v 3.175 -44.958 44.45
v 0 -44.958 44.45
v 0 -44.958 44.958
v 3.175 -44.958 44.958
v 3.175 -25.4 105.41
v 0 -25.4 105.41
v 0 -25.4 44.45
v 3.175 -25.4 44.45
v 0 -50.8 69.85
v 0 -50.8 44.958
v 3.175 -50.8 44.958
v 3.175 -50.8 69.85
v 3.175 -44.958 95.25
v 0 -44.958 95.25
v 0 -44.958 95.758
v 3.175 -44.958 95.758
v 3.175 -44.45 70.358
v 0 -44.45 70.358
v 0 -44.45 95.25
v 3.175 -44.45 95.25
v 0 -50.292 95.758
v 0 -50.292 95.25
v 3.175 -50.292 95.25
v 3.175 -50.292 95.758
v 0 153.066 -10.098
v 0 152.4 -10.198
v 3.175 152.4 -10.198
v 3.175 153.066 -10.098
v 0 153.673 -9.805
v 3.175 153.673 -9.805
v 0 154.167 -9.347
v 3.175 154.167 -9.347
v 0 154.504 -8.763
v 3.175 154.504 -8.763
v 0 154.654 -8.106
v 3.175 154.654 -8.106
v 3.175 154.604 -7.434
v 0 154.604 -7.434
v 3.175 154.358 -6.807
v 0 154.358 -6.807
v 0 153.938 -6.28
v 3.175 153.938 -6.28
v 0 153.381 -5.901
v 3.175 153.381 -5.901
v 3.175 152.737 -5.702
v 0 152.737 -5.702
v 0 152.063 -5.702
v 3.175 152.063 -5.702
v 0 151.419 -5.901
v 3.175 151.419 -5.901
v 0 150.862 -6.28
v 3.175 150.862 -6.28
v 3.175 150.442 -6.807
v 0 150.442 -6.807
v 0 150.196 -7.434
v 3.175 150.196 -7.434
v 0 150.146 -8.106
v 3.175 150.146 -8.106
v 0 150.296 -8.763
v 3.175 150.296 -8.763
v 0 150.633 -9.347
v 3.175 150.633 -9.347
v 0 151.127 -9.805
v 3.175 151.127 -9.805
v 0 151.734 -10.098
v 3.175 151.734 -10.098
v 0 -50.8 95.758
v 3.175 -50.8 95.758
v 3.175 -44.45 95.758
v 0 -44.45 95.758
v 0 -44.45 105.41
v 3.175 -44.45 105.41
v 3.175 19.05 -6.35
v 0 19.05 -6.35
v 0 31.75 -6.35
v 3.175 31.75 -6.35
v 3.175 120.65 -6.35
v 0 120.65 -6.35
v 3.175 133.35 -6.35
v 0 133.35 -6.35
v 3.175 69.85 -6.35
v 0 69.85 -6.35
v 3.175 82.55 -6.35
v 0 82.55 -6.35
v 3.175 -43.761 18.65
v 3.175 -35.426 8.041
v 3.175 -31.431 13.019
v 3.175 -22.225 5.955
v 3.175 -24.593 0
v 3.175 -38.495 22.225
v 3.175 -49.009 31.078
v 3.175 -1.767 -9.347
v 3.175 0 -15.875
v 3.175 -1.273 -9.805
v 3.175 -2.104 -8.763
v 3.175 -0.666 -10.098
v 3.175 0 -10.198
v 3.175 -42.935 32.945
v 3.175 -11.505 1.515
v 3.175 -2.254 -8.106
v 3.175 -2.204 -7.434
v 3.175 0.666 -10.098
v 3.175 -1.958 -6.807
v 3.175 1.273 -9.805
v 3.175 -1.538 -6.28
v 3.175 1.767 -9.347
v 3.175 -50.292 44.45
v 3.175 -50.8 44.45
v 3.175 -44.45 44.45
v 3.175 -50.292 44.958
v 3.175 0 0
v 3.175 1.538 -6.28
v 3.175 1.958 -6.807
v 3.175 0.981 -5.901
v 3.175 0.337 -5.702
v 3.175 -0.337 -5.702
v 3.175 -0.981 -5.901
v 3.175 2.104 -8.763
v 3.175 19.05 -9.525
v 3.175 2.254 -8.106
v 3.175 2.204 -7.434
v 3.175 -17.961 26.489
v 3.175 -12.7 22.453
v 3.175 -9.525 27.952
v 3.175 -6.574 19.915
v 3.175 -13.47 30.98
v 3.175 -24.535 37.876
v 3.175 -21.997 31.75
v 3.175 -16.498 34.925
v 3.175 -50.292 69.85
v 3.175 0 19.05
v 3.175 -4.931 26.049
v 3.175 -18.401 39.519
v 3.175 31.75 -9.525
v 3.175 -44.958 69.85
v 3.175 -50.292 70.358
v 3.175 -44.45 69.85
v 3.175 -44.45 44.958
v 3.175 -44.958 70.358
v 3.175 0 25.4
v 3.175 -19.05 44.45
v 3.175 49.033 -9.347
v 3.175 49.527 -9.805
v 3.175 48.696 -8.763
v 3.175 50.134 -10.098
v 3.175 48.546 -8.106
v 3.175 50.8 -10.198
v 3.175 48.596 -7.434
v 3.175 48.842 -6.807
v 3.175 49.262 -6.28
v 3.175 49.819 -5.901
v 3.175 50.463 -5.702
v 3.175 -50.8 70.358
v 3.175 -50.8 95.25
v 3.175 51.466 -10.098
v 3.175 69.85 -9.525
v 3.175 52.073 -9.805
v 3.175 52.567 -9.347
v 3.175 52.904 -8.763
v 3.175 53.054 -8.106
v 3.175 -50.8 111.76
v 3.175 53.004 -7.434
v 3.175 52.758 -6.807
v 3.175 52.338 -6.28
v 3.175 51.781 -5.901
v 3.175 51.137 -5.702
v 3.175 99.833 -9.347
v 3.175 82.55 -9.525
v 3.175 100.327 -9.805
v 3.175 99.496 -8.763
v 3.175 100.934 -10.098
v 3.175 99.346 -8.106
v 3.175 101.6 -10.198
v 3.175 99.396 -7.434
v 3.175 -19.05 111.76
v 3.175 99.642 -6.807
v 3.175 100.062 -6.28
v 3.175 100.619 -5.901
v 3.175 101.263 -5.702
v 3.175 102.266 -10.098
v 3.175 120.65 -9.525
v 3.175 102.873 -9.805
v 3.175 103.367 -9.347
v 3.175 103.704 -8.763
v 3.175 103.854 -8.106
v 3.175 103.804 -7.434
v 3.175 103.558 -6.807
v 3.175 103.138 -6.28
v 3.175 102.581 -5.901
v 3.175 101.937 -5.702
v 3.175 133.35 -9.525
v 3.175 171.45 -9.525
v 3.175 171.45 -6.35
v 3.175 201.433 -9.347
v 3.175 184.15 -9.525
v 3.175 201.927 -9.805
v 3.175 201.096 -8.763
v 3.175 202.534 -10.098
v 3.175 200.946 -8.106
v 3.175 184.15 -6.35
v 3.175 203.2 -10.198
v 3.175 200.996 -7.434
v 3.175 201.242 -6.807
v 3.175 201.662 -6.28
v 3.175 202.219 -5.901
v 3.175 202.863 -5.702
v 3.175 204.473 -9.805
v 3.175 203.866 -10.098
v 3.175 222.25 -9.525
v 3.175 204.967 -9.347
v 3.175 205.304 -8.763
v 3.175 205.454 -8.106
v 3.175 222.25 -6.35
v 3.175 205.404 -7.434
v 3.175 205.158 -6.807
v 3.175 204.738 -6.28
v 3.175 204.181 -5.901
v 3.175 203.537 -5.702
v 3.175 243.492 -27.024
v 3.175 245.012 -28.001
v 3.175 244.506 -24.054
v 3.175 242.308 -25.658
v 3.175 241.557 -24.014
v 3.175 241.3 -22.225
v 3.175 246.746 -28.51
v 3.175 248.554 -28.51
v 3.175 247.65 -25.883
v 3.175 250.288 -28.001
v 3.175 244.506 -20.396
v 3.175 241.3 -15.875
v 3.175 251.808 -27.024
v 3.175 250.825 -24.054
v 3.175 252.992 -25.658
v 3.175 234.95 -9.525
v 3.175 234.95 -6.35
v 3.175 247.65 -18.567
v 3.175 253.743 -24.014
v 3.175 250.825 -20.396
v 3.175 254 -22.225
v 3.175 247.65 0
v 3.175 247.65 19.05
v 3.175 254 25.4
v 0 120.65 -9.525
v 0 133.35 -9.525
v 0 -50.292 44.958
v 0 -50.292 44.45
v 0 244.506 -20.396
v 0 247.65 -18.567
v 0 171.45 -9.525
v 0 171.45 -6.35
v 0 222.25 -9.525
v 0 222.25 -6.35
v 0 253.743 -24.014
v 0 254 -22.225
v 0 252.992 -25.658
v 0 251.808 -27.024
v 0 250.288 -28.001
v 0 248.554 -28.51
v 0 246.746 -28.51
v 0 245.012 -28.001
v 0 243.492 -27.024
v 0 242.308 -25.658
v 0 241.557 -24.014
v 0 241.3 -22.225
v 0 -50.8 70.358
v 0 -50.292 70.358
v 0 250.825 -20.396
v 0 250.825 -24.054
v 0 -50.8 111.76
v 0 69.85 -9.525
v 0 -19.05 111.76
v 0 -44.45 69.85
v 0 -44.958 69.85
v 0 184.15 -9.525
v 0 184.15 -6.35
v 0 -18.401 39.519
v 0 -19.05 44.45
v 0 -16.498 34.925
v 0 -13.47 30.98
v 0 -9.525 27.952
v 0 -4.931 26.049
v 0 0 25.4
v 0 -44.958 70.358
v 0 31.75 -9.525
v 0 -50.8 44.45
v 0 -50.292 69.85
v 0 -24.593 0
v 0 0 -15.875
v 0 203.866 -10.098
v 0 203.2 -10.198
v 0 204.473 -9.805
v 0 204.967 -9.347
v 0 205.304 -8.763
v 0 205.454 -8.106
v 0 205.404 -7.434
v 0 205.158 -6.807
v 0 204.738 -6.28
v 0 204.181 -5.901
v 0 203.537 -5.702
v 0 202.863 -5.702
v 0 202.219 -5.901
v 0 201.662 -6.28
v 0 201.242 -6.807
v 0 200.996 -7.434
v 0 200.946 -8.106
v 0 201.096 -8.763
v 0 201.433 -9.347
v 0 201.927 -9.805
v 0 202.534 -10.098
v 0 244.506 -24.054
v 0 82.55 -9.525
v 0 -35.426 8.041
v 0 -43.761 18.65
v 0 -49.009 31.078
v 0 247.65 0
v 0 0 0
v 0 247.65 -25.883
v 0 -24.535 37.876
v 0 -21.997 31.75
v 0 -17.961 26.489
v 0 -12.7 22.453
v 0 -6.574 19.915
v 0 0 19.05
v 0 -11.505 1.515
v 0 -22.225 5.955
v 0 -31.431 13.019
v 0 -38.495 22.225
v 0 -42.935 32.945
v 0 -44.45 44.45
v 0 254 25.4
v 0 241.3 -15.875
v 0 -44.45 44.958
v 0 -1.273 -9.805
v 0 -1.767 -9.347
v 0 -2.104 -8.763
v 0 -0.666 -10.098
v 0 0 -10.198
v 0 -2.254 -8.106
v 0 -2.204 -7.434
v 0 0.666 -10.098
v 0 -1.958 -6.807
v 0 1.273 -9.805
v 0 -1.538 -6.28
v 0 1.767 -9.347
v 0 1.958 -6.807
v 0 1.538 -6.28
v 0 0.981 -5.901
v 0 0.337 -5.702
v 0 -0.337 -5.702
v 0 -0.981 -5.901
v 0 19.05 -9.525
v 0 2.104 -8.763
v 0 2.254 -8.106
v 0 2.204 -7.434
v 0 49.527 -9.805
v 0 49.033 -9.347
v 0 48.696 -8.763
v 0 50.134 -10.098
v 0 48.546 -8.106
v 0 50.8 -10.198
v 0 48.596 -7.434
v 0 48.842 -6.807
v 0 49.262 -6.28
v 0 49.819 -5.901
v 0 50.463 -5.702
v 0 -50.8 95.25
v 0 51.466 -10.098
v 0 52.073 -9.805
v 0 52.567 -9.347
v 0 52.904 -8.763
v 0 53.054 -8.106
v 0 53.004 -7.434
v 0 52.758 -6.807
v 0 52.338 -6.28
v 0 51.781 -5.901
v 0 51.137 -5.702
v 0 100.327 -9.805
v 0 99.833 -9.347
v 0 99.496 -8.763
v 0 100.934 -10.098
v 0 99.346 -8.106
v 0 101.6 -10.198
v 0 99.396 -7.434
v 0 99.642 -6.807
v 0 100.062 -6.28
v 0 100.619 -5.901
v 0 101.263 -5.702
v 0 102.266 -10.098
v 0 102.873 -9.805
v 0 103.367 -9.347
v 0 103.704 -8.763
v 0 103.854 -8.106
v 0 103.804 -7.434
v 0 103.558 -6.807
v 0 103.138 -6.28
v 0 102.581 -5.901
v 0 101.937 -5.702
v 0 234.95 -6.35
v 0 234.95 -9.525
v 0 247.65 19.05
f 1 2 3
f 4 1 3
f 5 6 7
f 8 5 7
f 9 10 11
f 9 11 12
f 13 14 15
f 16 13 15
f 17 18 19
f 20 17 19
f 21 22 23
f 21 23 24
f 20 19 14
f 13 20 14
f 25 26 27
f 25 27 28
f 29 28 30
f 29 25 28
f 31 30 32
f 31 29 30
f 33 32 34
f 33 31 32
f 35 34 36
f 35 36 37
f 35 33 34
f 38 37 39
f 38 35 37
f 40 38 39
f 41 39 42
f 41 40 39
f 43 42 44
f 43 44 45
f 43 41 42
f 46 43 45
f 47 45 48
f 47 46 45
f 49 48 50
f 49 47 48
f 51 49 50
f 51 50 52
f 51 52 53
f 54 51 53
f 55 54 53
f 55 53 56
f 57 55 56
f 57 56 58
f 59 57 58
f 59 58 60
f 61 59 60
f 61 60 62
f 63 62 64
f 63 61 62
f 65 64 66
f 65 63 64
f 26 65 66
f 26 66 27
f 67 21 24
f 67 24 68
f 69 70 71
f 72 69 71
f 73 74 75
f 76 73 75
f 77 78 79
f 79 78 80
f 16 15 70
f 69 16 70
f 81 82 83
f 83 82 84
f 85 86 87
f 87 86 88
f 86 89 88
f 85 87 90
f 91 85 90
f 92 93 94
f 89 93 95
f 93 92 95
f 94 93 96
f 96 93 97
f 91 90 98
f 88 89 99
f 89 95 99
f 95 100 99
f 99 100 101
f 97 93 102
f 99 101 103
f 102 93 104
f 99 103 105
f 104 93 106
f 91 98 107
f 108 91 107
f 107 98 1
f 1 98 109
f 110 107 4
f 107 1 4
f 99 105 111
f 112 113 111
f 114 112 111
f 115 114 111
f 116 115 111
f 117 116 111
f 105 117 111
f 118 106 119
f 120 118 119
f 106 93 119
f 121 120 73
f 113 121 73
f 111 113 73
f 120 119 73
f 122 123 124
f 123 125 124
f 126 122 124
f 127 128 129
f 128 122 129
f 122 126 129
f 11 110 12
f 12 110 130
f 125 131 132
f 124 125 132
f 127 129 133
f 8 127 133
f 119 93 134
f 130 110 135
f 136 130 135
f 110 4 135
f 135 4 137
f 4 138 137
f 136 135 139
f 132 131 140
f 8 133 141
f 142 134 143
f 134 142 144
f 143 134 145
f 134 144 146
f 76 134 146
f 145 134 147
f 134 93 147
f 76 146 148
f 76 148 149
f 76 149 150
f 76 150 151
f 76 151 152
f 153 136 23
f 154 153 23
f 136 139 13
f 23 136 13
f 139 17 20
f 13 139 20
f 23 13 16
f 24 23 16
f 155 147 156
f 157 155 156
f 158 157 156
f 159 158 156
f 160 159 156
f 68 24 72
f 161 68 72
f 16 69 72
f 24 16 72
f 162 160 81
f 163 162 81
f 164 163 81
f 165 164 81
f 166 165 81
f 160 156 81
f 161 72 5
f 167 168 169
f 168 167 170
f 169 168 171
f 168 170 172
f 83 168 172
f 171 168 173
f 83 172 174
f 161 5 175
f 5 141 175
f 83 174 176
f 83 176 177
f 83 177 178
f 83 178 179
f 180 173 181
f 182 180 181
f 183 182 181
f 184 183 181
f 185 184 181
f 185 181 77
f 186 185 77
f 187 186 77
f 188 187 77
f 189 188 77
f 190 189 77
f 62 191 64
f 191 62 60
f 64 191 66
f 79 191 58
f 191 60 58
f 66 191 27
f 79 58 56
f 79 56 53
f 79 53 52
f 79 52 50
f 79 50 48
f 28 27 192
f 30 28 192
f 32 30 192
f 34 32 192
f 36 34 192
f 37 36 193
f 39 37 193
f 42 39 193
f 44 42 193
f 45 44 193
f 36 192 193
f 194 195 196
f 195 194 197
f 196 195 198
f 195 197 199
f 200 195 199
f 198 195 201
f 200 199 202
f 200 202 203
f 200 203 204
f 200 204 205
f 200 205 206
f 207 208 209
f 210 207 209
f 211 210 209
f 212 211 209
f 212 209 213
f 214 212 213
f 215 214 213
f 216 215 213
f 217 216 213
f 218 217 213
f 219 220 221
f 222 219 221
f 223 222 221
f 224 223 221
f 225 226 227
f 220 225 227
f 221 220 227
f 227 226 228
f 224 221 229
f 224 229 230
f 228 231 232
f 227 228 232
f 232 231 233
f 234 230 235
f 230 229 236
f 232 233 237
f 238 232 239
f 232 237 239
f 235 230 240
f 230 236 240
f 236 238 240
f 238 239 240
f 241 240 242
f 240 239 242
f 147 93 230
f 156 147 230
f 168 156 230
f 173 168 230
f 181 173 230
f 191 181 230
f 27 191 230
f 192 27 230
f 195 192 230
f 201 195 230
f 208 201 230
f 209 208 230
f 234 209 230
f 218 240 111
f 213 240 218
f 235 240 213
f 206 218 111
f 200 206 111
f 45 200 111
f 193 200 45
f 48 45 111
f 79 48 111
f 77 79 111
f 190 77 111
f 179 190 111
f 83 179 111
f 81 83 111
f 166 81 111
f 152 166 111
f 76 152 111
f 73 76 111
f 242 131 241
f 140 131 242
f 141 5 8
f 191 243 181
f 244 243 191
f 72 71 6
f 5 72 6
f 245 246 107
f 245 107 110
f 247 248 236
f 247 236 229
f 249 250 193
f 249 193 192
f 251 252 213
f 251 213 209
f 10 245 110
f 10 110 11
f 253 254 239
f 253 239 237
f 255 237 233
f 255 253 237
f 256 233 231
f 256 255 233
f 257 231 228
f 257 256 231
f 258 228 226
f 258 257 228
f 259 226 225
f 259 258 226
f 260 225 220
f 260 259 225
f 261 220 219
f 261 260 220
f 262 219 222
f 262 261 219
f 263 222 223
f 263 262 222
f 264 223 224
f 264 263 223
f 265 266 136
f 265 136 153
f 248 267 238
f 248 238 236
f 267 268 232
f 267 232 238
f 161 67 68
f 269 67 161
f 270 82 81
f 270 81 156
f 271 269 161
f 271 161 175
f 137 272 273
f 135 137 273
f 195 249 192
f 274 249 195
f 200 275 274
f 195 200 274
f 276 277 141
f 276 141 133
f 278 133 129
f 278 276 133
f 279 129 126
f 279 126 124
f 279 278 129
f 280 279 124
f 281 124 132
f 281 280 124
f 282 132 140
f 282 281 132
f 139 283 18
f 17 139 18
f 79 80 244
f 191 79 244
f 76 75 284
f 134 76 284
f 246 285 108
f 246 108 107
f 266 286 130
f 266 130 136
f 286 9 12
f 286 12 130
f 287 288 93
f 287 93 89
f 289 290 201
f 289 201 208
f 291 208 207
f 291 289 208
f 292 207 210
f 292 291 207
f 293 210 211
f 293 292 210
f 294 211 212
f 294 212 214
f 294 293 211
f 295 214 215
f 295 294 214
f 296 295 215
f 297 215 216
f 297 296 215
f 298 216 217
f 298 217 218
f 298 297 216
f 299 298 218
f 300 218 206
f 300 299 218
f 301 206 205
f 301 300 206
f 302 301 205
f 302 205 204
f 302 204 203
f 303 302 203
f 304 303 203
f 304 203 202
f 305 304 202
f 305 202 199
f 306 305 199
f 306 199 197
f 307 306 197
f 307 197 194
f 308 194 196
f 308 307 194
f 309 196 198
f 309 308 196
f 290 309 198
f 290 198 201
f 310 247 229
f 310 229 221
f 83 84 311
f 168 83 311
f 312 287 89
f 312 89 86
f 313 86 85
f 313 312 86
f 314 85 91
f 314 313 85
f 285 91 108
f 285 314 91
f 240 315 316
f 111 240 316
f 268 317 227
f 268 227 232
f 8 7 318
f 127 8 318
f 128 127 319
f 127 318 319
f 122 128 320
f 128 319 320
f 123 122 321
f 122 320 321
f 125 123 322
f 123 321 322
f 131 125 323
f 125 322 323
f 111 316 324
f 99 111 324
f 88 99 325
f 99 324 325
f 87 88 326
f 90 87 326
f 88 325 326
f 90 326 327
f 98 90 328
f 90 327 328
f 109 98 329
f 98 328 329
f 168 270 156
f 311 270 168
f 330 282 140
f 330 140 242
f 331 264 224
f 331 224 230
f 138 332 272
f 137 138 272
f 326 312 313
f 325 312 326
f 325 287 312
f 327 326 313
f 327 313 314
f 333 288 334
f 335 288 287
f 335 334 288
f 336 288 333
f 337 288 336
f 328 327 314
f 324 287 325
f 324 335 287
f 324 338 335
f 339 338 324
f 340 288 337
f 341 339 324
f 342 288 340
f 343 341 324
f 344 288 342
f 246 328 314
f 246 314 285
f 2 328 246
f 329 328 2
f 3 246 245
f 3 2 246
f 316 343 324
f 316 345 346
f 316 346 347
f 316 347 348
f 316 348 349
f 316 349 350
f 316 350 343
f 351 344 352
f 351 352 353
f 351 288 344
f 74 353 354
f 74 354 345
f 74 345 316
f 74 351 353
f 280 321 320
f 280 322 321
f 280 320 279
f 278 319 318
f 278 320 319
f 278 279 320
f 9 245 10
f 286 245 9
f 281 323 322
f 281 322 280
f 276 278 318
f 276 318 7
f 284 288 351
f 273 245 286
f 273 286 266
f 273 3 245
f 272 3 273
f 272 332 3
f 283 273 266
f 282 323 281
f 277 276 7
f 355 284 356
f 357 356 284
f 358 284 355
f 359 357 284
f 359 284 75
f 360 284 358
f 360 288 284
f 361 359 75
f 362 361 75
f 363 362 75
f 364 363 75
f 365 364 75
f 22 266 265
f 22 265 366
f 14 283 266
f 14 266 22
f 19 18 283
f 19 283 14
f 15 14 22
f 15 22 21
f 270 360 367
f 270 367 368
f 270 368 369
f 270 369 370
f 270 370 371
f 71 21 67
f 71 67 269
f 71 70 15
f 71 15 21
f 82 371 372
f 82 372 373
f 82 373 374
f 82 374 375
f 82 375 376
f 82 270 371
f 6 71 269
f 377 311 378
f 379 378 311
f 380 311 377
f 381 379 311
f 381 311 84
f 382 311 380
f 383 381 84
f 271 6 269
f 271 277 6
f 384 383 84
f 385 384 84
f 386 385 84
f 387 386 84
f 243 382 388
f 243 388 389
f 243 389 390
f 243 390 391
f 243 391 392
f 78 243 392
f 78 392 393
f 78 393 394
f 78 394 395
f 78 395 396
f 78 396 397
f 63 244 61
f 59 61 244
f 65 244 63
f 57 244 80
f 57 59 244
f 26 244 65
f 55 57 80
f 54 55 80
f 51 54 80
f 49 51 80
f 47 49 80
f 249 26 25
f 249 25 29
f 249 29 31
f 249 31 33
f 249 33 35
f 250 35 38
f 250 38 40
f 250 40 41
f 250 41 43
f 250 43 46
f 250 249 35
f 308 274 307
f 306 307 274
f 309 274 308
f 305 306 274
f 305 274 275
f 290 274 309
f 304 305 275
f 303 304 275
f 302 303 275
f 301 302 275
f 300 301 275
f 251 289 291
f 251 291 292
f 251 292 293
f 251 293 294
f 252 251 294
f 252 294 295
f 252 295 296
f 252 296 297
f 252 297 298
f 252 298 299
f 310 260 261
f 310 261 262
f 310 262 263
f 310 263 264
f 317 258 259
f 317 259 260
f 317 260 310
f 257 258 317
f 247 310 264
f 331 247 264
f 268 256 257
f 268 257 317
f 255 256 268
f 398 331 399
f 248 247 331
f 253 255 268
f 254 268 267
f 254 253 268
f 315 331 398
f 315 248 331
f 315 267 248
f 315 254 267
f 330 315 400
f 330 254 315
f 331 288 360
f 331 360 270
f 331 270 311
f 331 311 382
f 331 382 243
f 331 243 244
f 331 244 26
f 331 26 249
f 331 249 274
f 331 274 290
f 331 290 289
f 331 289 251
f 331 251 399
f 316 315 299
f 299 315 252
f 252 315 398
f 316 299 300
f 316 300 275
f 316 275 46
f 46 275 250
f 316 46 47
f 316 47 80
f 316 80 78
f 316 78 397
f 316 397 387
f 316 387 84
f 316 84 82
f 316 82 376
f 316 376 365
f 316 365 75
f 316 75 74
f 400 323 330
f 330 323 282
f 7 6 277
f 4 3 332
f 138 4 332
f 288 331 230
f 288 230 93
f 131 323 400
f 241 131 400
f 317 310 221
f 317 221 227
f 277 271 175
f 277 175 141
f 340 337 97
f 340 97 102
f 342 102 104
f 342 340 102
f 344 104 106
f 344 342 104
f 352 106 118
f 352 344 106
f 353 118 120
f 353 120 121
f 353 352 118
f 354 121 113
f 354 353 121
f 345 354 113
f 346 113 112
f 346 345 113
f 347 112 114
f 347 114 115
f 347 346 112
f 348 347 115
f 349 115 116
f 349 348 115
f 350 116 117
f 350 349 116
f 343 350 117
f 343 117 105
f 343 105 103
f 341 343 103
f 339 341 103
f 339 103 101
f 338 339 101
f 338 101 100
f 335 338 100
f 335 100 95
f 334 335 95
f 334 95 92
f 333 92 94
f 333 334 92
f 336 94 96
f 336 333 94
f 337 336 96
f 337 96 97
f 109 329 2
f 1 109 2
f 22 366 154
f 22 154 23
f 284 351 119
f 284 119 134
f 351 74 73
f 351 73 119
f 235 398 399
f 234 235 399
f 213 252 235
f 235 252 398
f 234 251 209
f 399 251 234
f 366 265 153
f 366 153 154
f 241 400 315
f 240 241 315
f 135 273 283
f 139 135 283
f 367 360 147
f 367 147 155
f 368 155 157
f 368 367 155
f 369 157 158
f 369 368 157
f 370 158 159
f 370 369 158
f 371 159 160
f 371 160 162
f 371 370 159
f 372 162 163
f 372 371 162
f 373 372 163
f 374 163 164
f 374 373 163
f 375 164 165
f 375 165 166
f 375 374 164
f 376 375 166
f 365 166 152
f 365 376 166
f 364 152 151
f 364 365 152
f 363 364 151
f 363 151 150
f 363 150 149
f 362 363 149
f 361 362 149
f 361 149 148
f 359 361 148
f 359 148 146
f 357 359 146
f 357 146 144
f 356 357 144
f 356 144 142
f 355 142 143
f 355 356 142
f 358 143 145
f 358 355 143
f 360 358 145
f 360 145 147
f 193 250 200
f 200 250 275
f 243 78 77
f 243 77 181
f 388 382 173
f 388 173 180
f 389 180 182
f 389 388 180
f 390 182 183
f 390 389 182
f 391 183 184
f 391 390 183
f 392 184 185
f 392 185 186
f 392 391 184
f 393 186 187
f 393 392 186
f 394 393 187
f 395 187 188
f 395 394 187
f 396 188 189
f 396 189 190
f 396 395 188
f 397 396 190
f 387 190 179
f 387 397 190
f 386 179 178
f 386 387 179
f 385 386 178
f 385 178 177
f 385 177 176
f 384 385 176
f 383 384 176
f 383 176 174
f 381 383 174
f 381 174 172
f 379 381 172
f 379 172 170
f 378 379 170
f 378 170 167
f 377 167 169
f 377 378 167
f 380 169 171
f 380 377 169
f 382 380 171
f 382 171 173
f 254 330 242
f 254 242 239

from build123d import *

# Parameters (mm, degrees)
SKETCH2_R           = 2.2606
SKETCH2_W           = 3.175
SKETCH2_H           = 12.7
BOSS_EXTRUDE1_DEPTH = 3.175


with BuildPart() as part:
    # Sketch2 → Boss-Extrude1 (new body)
    with BuildSketch(Plane(origin=(0, 0, 0), x_dir=(0, 0, -1), z_dir=(1, 0, 0))):
        with BuildLine():
            Line((15.875, 254), (22.225, 254))
            ThreePointArc((22.225, 254), (28.575, 247.65), (22.225, 241.3))
            Line((22.225, 241.3), (15.875, 241.3))
            Line((15.875, 241.3), (15.875, 0))
            Line((15.875, 0), (0, -24.593444248))
            ThreePointArc((0, -24.593444248), (-18.649873719, -43.760638523), (-44.45, -50.8))
            Line((-44.45, -50.8), (-44.45, -50.292))
            Line((-44.45, -50.292), (-44.958, -50.292))
            Line((-44.958, -50.292), (-44.958, -50.8))
            Line((-44.958, -50.8), (-69.85, -50.8))
            Line((-69.85, -50.8), (-69.85, -50.292))
            Line((-69.85, -50.292), (-70.358, -50.292))
            Line((-70.358, -50.292), (-70.358, -50.8))
            Line((-70.358, -50.8), (-95.25, -50.8))
            Line((-95.25, -50.8), (-95.25, -50.292))
            Line((-95.25, -50.292), (-95.758, -50.292))
            Line((-95.758, -50.292), (-95.758, -50.8))
            Line((-95.758, -50.8), (-111.76, -50.8))
            Line((-111.76, -50.8), (-111.76, -44.45))
            Line((-111.76, -44.45), (-111.76, -25.4))
            Line((-111.76, -25.4), (-111.76, -19.05))
            Line((-111.76, -19.05), (-44.45, -19.05))
            ThreePointArc((-44.45, -19.05), (-30.979615818, -13.470384182), (-25.4, 0))
            Line((-25.4, 0), (-25.4, 247.65))
            Line((-25.4, 247.65), (-25.4, 254))
            Line((-25.4, 254), (0, 254))
            Line((0, 254), (15.875, 254))
        make_face()
        with Locations((7.9375, 0)):
            Circle(SKETCH2_R, mode=Mode.SUBTRACT)
        with Locations((7.9375, 50.8)):
            Circle(SKETCH2_R, mode=Mode.SUBTRACT)
        with Locations((7.9375, 101.6)):
            Circle(SKETCH2_R, mode=Mode.SUBTRACT)
        with Locations((7.9375, 152.4)):
            Circle(SKETCH2_R, mode=Mode.SUBTRACT)
        with Locations((7.9375, 203.2)):
            Circle(SKETCH2_R, mode=Mode.SUBTRACT)
        with BuildLine():
            Line((-44.958, -44.45), (-69.85, -44.45))
            Line((-69.85, -44.45), (-69.85, -44.958))
            Line((-69.85, -44.958), (-70.358, -44.958))
            Line((-70.358, -44.958), (-70.358, -44.45))
            Line((-70.358, -44.45), (-95.25, -44.45))
            Line((-95.25, -44.45), (-95.25, -44.958))
            Line((-95.25, -44.958), (-95.758, -44.958))
            Line((-95.758, -44.958), (-95.758, -44.45))
            Line((-95.758, -44.45), (-105.41, -44.45))
            Line((-105.41, -44.45), (-105.41, -25.4))
            Line((-105.41, -25.4), (-44.45, -25.4))
            ThreePointArc((-44.45, -25.4), (-26.489487758, -17.960512242), (-19.05, 0))
            Line((-19.05, 0), (-19.05, 247.65))
            Line((-19.05, 247.65), (0, 247.65))
            Line((0, 247.65), (0, 0))
            ThreePointArc((0, 0), (-13.019103576, -31.430896424), (-44.45, -44.45))
            Line((-44.45, -44.45), (-44.45, -44.958))
            Line((-44.45, -44.958), (-44.958, -44.958))
            Line((-44.958, -44.958), (-44.958, -44.45))
        make_face(mode=Mode.SUBTRACT)
        with Locations((7.9375, 228.6)):
            Rectangle(SKETCH2_W, SKETCH2_H, mode=Mode.SUBTRACT)
        with Locations((7.9375, 177.8)):
            Rectangle(SKETCH2_W, SKETCH2_H, mode=Mode.SUBTRACT)
        with Locations((7.9375, 76.2)):
            Rectangle(SKETCH2_W, SKETCH2_H, mode=Mode.SUBTRACT)
        with Locations((7.9375, 127)):
            Rectangle(SKETCH2_W, SKETCH2_H, mode=Mode.SUBTRACT)
        with Locations((7.9375, 25.4)):
            Rectangle(SKETCH2_W, SKETCH2_H, mode=Mode.SUBTRACT)
        Polygon((25.8826, 247.65), (24.0538, 250.825), (20.3962, 250.825), (18.5674, 247.65), (20.3962, 244.505584275), (24.0538, 244.505584275), align=None, mode=Mode.SUBTRACT)
    extrude(amount=BOSS_EXTRUDE1_DEPTH)


solid = part.part
